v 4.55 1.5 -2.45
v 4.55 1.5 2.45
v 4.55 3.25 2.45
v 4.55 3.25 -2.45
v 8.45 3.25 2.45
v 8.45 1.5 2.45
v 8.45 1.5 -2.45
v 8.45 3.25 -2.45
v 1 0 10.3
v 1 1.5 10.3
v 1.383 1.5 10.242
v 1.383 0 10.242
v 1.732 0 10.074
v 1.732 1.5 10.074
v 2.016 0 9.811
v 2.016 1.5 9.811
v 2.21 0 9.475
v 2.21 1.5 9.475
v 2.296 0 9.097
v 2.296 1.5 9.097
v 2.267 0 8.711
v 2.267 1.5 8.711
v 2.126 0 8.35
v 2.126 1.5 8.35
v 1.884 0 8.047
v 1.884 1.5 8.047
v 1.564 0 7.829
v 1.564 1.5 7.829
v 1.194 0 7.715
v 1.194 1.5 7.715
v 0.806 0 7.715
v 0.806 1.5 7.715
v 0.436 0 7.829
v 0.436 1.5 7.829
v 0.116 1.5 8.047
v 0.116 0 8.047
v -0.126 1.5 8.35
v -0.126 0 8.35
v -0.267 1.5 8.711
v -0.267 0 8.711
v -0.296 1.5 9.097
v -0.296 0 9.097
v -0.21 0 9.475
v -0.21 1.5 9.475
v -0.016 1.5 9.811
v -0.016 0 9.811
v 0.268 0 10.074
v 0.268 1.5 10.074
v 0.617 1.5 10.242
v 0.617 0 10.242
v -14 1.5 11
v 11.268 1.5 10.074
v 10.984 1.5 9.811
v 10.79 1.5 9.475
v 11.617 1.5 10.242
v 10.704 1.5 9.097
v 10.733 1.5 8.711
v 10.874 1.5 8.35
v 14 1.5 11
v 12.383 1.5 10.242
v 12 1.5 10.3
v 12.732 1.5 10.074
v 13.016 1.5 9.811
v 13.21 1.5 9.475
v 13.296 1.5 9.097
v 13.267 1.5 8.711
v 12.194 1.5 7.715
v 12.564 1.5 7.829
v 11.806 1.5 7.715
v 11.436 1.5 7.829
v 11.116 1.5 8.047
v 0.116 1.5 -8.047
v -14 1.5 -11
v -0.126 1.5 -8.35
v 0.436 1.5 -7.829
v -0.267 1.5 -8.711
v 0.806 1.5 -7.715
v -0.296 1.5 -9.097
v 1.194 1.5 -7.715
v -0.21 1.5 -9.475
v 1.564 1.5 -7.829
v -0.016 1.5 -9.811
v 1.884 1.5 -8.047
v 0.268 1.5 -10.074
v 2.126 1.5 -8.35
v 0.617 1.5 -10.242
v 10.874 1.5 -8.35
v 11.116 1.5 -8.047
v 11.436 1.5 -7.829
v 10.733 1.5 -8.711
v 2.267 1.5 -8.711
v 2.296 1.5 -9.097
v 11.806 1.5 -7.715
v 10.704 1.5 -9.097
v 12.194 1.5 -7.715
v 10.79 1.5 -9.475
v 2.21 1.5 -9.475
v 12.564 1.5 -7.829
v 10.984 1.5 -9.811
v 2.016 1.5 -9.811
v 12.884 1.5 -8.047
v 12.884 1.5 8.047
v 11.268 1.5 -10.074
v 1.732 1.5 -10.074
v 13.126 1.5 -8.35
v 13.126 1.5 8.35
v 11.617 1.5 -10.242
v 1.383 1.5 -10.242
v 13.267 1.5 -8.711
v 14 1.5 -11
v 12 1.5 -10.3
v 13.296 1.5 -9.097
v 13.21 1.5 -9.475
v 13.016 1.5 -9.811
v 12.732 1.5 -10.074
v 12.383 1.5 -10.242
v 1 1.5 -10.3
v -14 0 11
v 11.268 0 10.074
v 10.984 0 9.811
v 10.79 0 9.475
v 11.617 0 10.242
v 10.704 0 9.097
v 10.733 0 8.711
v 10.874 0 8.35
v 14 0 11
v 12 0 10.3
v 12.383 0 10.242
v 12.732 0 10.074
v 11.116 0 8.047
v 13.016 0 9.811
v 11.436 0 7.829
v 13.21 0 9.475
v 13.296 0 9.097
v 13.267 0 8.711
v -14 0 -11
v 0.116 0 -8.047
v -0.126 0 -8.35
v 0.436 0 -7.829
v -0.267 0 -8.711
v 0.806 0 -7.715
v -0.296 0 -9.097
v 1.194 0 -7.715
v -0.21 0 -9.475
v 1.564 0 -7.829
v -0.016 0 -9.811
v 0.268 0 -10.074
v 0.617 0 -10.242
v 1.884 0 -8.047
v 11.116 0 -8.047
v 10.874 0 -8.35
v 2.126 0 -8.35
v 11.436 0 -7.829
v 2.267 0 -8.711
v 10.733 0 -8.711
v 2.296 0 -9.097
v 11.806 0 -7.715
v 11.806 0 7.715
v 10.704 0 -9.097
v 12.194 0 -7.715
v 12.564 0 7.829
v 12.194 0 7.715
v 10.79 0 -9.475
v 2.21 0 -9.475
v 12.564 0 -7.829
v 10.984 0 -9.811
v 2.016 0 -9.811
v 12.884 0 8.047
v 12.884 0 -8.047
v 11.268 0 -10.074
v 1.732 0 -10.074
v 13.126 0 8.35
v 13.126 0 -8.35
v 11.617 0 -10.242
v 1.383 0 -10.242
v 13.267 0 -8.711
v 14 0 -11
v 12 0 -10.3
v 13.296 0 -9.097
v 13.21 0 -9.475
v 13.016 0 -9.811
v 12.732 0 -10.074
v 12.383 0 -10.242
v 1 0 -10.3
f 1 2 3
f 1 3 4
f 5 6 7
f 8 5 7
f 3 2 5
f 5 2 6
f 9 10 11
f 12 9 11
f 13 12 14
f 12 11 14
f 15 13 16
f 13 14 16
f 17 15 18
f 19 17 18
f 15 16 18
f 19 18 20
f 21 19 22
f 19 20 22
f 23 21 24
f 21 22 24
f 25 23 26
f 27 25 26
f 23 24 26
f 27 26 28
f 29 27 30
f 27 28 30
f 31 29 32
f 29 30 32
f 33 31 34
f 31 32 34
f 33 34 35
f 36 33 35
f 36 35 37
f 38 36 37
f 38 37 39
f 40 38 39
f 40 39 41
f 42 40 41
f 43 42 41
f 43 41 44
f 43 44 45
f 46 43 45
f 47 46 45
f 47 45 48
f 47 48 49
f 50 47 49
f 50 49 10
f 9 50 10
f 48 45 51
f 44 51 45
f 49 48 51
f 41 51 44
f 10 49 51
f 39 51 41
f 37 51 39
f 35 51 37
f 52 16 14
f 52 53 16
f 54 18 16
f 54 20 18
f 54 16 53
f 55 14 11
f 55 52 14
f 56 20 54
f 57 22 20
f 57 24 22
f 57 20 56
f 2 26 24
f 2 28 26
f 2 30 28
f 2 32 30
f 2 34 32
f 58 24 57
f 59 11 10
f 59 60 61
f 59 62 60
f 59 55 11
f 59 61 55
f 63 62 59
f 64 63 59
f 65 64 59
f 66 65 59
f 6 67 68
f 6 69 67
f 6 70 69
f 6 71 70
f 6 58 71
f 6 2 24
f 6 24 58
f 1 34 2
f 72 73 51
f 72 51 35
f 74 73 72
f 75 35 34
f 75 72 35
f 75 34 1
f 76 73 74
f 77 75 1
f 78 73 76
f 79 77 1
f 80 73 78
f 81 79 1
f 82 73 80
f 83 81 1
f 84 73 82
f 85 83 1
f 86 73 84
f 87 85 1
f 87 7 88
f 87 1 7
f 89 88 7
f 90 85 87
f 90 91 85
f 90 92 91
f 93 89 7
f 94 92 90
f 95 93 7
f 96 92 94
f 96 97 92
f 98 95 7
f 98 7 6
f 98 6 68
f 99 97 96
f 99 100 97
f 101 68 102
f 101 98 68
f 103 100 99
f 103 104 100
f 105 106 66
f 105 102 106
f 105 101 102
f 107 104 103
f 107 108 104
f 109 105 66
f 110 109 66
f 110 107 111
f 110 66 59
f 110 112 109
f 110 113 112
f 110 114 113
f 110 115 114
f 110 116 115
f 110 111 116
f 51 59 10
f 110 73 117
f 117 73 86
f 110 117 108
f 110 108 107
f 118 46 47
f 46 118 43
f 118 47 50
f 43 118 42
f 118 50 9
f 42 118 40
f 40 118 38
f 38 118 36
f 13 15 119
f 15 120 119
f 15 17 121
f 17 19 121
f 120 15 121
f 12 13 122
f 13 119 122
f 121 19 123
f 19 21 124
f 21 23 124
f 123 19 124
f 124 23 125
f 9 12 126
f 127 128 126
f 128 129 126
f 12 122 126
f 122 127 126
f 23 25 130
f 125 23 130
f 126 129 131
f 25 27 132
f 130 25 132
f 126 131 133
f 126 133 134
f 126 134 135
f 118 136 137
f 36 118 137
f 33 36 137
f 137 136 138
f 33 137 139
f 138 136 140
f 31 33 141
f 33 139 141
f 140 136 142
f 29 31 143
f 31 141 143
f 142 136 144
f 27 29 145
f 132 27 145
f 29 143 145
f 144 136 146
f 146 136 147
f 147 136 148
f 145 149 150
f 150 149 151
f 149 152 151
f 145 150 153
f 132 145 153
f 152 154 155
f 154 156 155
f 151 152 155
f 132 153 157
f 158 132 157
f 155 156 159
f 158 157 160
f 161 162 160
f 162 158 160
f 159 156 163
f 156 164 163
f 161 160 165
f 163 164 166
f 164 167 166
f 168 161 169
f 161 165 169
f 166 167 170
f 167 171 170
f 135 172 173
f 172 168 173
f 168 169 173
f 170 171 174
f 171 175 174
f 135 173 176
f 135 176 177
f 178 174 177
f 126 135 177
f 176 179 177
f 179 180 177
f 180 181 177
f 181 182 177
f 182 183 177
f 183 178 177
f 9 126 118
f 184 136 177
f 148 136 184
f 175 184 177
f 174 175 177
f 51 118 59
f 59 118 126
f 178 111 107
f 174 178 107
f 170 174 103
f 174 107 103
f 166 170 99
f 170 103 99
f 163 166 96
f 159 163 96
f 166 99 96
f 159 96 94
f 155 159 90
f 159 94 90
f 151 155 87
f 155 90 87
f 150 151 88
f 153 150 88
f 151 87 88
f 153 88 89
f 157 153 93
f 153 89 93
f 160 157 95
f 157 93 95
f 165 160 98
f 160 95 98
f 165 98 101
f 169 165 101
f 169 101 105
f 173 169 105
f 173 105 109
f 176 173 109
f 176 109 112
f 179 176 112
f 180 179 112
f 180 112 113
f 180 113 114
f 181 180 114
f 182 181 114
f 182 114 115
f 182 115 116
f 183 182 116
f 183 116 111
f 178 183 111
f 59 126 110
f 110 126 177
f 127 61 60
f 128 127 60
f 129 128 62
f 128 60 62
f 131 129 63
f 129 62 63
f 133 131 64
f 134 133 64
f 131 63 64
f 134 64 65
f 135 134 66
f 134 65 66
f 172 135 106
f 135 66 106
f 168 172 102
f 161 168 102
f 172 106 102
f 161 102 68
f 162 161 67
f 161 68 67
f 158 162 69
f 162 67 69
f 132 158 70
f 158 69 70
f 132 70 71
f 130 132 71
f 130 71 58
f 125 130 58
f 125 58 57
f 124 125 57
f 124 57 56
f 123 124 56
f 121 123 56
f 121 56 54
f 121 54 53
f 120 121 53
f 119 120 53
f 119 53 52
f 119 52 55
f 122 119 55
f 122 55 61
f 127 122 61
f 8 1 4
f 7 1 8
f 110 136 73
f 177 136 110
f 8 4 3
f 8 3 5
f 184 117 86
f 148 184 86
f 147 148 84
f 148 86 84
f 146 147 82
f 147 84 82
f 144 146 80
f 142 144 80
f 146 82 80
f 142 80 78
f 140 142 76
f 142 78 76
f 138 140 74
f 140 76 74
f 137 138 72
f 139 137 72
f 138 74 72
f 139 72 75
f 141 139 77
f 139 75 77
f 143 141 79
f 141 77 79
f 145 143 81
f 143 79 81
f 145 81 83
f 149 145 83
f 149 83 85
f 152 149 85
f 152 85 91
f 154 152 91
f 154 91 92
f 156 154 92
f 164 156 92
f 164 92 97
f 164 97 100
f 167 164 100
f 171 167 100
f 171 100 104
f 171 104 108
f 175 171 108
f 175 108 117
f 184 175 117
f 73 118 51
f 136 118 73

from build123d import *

# Parameters (mm, degrees)
SKETCH1_W           = 28
SKETCH1_H           = 22
BOSS_EXTRUDE1_DEPTH = 1.5
SKETCH2_W           = 3.9
SKETCH2_H           = 4.9
BOSS_EXTRUDE2_DEPTH = 1.75
SKETCH3_R           = 1.3
CUT_EXTRUDE1_DEPTH  = 1.75


with BuildPart() as part:
    # Sketch1 → Boss-Extrude1 (new body)
    with BuildSketch(Plane(origin=(0, 0, 0), x_dir=(1, 0, 0), z_dir=(0, 1, 0))):
        Rectangle(SKETCH1_W, SKETCH1_H)
    extrude(amount=BOSS_EXTRUDE1_DEPTH)

    # Sketch2 → Boss-Extrude2 (add)
    with BuildSketch(Plane(origin=(0, 1.5, 0), x_dir=(1, 0, 0), z_dir=(0, 1, 0))):
        with Locations((6.5, 0)):
            Rectangle(SKETCH2_W, SKETCH2_H)
    extrude(amount=BOSS_EXTRUDE2_DEPTH)

    # Sketch3 → Cut-Extrude1 (cut)
    with BuildSketch(Plane(origin=(0, 1.5, 0), x_dir=(1, 0, 0), z_dir=(0, 1, 0))):
        with Locations(Location((12, -9, 0), (0, 0, 270))):
            Circle(SKETCH3_R)
        with Locations(Location((1, -9, 0), (0, 0, 270))):
            Circle(SKETCH3_R)
        with Locations(Location((12, 9, 0), (0, 0, 90))):
            Circle(SKETCH3_R)
        with Locations(Location((1, 9, 0), (0, 0, 90))):
            Circle(SKETCH3_R)
    extrude(amount=-CUT_EXTRUDE1_DEPTH, mode=Mode.SUBTRACT)


solid = part.part
